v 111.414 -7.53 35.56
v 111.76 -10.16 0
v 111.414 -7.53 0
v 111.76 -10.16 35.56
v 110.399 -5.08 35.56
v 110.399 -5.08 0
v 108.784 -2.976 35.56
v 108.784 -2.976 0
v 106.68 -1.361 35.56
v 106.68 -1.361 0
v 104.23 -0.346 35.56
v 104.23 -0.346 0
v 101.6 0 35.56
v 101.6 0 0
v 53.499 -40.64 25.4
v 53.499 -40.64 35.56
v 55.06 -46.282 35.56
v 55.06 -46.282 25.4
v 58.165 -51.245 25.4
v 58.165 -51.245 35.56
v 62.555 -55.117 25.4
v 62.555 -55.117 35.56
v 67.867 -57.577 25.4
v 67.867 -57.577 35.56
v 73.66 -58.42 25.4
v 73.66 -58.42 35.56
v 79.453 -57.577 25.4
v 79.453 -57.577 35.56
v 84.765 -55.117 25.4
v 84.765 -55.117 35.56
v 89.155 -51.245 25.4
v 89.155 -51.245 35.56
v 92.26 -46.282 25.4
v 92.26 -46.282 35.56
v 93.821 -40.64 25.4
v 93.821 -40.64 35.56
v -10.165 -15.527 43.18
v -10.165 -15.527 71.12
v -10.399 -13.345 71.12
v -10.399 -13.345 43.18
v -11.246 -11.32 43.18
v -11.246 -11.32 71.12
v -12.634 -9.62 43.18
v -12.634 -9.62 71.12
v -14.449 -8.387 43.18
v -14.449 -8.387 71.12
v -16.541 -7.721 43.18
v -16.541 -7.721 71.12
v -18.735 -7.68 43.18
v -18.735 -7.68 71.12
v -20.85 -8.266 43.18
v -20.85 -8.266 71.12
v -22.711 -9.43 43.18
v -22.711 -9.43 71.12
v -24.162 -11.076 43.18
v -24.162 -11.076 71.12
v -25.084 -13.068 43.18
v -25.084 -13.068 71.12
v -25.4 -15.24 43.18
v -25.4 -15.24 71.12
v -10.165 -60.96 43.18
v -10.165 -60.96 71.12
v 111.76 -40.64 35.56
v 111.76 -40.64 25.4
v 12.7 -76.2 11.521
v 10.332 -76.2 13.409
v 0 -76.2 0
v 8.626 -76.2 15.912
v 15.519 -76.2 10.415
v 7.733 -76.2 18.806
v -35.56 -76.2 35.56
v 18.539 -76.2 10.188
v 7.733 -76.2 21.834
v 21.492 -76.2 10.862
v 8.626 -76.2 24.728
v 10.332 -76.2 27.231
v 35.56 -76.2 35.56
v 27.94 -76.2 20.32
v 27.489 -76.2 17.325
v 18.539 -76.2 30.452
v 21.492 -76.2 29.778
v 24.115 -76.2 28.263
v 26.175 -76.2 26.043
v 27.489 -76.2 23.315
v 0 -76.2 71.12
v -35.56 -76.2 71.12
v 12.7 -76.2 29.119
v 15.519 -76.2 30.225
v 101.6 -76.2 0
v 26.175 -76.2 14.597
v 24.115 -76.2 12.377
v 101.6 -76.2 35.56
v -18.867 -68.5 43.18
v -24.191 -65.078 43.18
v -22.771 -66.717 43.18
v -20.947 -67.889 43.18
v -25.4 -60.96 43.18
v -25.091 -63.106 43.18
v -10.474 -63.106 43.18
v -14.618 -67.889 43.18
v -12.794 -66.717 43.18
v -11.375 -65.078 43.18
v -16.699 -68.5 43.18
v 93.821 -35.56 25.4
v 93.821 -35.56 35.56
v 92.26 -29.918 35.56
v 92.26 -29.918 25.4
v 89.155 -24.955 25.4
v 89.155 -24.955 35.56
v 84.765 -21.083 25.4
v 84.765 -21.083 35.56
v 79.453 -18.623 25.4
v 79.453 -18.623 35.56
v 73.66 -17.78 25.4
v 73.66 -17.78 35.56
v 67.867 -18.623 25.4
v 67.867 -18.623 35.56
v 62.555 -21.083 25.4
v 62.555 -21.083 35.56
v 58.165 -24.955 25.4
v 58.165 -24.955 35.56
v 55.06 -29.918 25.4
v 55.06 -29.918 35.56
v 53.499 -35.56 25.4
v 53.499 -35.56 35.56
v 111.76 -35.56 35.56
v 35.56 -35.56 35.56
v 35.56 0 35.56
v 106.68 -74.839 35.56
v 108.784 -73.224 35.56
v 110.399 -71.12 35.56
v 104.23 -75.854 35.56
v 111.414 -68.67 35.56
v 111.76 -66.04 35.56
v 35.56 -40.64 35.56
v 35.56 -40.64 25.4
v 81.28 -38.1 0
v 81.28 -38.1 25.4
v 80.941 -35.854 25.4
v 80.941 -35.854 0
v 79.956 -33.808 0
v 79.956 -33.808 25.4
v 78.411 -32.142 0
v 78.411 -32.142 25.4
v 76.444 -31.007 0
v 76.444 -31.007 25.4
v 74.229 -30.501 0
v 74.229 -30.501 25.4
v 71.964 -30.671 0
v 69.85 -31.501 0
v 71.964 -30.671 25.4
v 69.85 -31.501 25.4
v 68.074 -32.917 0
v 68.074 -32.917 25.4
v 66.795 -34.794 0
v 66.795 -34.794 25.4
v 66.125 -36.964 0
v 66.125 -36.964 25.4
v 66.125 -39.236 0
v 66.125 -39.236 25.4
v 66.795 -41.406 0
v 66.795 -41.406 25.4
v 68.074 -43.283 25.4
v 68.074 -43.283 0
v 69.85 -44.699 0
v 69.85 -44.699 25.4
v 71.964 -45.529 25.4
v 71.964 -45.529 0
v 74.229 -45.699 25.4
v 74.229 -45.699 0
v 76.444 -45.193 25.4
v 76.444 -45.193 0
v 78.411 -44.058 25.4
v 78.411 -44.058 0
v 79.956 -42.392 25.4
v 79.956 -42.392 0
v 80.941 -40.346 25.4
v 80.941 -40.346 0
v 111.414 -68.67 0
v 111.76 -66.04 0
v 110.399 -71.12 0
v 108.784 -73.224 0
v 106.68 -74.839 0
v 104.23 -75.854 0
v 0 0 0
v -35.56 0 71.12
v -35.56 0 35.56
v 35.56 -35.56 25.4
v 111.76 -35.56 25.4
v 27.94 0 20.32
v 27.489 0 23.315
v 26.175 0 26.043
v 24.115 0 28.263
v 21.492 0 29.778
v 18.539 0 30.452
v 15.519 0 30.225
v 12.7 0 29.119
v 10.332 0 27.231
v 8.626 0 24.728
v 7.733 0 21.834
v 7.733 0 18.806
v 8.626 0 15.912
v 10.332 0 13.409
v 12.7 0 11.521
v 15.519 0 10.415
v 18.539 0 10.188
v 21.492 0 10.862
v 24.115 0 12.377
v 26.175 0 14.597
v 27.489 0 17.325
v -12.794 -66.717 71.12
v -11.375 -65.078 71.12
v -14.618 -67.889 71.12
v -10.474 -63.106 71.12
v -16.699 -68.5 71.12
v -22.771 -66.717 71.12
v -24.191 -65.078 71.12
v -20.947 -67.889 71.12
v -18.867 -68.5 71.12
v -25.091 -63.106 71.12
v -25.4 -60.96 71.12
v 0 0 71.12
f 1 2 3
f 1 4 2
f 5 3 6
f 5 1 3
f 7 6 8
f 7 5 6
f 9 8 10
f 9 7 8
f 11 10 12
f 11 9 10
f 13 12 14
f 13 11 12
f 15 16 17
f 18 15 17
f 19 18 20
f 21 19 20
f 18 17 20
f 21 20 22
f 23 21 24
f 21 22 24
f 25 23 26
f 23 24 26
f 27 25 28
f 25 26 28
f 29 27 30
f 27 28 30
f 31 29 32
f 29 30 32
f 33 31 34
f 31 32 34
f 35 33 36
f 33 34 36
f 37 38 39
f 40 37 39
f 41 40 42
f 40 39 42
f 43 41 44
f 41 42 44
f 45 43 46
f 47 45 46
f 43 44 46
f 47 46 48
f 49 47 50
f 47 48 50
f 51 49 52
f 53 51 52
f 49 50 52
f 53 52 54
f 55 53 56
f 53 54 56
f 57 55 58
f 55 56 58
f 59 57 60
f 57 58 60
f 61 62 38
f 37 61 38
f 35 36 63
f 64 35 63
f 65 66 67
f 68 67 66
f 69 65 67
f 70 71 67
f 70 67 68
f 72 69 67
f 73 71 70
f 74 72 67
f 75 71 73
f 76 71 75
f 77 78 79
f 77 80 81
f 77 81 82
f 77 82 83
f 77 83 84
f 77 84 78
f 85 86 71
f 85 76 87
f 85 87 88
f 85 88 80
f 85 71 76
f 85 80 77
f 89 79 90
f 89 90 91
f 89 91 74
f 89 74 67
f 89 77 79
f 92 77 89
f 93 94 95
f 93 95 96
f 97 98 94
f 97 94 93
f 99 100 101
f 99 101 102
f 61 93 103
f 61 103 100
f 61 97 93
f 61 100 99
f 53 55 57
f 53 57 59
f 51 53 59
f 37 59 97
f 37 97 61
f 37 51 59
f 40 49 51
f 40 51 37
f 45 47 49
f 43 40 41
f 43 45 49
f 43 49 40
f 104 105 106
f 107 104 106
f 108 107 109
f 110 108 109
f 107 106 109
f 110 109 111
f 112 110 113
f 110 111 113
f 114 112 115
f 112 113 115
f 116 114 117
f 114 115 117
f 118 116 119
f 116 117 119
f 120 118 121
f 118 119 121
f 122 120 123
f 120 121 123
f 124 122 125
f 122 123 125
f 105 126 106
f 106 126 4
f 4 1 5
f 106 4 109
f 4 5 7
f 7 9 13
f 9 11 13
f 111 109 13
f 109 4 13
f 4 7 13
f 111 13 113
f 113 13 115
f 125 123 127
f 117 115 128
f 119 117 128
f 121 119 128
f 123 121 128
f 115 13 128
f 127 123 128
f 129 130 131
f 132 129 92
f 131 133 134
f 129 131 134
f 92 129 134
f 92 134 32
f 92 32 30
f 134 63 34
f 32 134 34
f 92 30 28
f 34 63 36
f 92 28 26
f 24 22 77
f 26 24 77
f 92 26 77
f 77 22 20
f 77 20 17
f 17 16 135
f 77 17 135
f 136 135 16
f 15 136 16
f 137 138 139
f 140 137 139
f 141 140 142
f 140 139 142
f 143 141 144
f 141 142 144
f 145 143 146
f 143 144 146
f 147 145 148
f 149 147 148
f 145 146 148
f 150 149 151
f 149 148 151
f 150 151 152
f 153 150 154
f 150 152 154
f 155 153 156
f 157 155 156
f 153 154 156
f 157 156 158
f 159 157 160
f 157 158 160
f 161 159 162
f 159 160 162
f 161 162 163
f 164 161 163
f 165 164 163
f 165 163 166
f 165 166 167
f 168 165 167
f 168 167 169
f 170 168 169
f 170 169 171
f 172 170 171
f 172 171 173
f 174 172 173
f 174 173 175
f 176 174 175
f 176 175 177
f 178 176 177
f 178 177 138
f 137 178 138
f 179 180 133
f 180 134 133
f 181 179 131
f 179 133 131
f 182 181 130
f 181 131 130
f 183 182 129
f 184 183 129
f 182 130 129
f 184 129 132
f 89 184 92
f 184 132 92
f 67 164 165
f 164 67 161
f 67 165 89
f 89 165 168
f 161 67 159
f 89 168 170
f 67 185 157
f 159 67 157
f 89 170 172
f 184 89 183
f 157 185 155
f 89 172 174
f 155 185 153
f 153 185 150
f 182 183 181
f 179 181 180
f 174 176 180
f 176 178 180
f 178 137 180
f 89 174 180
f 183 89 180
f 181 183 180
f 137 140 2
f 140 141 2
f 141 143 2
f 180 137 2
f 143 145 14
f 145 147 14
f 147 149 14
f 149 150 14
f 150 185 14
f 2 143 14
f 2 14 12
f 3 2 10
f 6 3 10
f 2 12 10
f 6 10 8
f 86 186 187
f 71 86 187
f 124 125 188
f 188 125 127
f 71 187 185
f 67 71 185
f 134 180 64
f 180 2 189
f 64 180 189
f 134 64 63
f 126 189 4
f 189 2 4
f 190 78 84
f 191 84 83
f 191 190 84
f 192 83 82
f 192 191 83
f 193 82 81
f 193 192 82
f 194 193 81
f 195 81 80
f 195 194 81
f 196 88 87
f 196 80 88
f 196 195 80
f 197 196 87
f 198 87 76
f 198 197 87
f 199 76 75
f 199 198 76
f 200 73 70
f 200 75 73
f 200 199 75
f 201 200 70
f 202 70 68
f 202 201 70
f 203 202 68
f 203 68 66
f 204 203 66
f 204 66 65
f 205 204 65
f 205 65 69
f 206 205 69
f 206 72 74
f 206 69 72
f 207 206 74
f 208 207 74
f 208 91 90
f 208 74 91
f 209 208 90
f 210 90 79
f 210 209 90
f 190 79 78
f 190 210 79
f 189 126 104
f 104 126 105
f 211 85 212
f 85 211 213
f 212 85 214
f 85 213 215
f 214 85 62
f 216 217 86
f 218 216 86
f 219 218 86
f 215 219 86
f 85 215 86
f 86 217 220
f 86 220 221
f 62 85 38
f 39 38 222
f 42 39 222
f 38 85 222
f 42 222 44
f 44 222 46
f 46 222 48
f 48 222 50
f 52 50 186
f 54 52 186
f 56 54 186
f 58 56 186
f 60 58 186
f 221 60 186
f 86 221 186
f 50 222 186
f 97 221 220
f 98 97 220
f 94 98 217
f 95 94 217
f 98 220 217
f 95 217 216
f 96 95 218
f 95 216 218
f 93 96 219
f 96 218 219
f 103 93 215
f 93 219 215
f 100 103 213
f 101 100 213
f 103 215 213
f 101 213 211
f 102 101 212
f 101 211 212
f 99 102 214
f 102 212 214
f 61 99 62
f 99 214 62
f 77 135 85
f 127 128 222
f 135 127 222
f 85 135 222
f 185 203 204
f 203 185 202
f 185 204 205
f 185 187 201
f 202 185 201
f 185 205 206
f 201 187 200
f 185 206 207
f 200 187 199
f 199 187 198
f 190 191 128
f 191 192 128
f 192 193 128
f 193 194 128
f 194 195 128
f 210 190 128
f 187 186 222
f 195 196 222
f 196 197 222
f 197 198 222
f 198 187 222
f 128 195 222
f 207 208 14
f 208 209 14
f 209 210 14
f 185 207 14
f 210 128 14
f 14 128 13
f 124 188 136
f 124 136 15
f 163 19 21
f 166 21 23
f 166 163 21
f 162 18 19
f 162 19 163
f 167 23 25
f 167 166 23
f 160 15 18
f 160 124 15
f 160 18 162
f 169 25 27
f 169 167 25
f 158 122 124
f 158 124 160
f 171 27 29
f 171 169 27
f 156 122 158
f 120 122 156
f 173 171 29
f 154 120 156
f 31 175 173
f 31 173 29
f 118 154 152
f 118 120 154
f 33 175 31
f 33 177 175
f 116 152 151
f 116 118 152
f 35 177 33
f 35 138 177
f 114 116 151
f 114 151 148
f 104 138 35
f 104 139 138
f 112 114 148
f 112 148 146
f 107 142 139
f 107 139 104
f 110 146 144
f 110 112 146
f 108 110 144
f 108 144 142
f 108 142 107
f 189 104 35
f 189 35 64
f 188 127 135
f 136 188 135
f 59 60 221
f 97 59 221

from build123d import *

# Parameters (mm, degrees)
F1_DEPTH  = 76.2
F2_R      = 10.16
F3_R      = 10.16
F4_DEPTH  = 76.201
F6_DEPTH  = 27.94
F8_DEPTH  = 10.16
F9_R      = 7.62
F10_DEPTH = 25.401


with BuildPart() as f1:
    # F0 (on Front) → F1 (new body)
    with BuildSketch(Plane.XZ):
        Polygon((-35.56, 35.56), (0, 0), (111.76, 0), (111.76, 35.56), (35.56, 35.56), (0, 71.12), (-35.56, 71.12), align=None)
    extrude(amount=F1_DEPTH)

    # F2
    f2_edges = [f1.edges().sort_by_distance(p)[0] for p in [
        (111.76, -76.2, 17.78),
        (111.76, 0, 17.78),
    ]]
    fillet(f2_edges, radius=F2_R)

    # F3 (on Front) → F4 (cut, through all)
    with BuildSketch(Plane.XZ):
        with Locations((17.78, 20.32)):
            Circle(F3_R)
    extrude(amount=F4_DEPTH, mode=Mode.SUBTRACT)

    # F5 (on face) → F6 (cut)
    with BuildSketch(Plane.XY.offset(71.12)):
        with BuildLine():
            ThreePointArc((-10.165424, -15.527446), (-17.636252, -7.621356), (-25.4, -15.24))
            Line((-25.4, -15.24), (-25.4, -60.96))
            ThreePointArc((-25.4, -60.96), (-17.782712, -68.577288), (-10.165424, -60.96))
            Line((-10.165424, -60.96), (-10.165424, -15.527446))
        make_face()
    extrude(amount=-F6_DEPTH, mode=Mode.SUBTRACT)

    # F7 (on face) → F8 (cut)
    with BuildSketch(Plane.XY.offset(35.56)):
        with BuildLine():
            ThreePointArc((93.820625, -40.64), (93.940117, -39.372498), (93.98, -38.1))
            ThreePointArc((93.98, -38.1), (93.940117, -36.827502), (93.820625, -35.56))
            ThreePointArc((93.820625, -35.56), (73.66, -17.78), (53.499375, -35.56))
            ThreePointArc((53.499375, -35.56), (53.34, -38.1), (53.499375, -40.64))
            ThreePointArc((53.499375, -40.64), (73.66, -58.42), (93.820625, -40.64))
        make_face()
        with BuildLine():
            ThreePointArc((93.820625, -35.56), (93.940117, -36.827502), (93.98, -38.1))
            ThreePointArc((93.98, -38.1), (93.940117, -39.372498), (93.820625, -40.64))
            Line((93.820625, -40.64), (111.76, -40.64))
            Line((111.76, -40.64), (111.76, -35.56))
            Line((111.76, -35.56), (93.820625, -35.56))
        make_face()
        with BuildLine():
            ThreePointArc((53.499375, -40.64), (53.34, -38.1), (53.499375, -35.56))
            Line((53.499375, -35.56), (35.56, -35.56))
            Line((35.56, -35.56), (35.56, -40.64))
            Line((35.56, -40.64), (53.499375, -40.64))
        make_face()
    extrude(amount=-F8_DEPTH, mode=Mode.SUBTRACT)

    # F9 (on face) → F10 (cut, through all)
    with BuildSketch(Plane.XY.offset(25.4)):
        with Locations((73.66, -38.1)):
            Circle(F9_R)
    extrude(amount=-F10_DEPTH, mode=Mode.SUBTRACT)


solid = f1.part
